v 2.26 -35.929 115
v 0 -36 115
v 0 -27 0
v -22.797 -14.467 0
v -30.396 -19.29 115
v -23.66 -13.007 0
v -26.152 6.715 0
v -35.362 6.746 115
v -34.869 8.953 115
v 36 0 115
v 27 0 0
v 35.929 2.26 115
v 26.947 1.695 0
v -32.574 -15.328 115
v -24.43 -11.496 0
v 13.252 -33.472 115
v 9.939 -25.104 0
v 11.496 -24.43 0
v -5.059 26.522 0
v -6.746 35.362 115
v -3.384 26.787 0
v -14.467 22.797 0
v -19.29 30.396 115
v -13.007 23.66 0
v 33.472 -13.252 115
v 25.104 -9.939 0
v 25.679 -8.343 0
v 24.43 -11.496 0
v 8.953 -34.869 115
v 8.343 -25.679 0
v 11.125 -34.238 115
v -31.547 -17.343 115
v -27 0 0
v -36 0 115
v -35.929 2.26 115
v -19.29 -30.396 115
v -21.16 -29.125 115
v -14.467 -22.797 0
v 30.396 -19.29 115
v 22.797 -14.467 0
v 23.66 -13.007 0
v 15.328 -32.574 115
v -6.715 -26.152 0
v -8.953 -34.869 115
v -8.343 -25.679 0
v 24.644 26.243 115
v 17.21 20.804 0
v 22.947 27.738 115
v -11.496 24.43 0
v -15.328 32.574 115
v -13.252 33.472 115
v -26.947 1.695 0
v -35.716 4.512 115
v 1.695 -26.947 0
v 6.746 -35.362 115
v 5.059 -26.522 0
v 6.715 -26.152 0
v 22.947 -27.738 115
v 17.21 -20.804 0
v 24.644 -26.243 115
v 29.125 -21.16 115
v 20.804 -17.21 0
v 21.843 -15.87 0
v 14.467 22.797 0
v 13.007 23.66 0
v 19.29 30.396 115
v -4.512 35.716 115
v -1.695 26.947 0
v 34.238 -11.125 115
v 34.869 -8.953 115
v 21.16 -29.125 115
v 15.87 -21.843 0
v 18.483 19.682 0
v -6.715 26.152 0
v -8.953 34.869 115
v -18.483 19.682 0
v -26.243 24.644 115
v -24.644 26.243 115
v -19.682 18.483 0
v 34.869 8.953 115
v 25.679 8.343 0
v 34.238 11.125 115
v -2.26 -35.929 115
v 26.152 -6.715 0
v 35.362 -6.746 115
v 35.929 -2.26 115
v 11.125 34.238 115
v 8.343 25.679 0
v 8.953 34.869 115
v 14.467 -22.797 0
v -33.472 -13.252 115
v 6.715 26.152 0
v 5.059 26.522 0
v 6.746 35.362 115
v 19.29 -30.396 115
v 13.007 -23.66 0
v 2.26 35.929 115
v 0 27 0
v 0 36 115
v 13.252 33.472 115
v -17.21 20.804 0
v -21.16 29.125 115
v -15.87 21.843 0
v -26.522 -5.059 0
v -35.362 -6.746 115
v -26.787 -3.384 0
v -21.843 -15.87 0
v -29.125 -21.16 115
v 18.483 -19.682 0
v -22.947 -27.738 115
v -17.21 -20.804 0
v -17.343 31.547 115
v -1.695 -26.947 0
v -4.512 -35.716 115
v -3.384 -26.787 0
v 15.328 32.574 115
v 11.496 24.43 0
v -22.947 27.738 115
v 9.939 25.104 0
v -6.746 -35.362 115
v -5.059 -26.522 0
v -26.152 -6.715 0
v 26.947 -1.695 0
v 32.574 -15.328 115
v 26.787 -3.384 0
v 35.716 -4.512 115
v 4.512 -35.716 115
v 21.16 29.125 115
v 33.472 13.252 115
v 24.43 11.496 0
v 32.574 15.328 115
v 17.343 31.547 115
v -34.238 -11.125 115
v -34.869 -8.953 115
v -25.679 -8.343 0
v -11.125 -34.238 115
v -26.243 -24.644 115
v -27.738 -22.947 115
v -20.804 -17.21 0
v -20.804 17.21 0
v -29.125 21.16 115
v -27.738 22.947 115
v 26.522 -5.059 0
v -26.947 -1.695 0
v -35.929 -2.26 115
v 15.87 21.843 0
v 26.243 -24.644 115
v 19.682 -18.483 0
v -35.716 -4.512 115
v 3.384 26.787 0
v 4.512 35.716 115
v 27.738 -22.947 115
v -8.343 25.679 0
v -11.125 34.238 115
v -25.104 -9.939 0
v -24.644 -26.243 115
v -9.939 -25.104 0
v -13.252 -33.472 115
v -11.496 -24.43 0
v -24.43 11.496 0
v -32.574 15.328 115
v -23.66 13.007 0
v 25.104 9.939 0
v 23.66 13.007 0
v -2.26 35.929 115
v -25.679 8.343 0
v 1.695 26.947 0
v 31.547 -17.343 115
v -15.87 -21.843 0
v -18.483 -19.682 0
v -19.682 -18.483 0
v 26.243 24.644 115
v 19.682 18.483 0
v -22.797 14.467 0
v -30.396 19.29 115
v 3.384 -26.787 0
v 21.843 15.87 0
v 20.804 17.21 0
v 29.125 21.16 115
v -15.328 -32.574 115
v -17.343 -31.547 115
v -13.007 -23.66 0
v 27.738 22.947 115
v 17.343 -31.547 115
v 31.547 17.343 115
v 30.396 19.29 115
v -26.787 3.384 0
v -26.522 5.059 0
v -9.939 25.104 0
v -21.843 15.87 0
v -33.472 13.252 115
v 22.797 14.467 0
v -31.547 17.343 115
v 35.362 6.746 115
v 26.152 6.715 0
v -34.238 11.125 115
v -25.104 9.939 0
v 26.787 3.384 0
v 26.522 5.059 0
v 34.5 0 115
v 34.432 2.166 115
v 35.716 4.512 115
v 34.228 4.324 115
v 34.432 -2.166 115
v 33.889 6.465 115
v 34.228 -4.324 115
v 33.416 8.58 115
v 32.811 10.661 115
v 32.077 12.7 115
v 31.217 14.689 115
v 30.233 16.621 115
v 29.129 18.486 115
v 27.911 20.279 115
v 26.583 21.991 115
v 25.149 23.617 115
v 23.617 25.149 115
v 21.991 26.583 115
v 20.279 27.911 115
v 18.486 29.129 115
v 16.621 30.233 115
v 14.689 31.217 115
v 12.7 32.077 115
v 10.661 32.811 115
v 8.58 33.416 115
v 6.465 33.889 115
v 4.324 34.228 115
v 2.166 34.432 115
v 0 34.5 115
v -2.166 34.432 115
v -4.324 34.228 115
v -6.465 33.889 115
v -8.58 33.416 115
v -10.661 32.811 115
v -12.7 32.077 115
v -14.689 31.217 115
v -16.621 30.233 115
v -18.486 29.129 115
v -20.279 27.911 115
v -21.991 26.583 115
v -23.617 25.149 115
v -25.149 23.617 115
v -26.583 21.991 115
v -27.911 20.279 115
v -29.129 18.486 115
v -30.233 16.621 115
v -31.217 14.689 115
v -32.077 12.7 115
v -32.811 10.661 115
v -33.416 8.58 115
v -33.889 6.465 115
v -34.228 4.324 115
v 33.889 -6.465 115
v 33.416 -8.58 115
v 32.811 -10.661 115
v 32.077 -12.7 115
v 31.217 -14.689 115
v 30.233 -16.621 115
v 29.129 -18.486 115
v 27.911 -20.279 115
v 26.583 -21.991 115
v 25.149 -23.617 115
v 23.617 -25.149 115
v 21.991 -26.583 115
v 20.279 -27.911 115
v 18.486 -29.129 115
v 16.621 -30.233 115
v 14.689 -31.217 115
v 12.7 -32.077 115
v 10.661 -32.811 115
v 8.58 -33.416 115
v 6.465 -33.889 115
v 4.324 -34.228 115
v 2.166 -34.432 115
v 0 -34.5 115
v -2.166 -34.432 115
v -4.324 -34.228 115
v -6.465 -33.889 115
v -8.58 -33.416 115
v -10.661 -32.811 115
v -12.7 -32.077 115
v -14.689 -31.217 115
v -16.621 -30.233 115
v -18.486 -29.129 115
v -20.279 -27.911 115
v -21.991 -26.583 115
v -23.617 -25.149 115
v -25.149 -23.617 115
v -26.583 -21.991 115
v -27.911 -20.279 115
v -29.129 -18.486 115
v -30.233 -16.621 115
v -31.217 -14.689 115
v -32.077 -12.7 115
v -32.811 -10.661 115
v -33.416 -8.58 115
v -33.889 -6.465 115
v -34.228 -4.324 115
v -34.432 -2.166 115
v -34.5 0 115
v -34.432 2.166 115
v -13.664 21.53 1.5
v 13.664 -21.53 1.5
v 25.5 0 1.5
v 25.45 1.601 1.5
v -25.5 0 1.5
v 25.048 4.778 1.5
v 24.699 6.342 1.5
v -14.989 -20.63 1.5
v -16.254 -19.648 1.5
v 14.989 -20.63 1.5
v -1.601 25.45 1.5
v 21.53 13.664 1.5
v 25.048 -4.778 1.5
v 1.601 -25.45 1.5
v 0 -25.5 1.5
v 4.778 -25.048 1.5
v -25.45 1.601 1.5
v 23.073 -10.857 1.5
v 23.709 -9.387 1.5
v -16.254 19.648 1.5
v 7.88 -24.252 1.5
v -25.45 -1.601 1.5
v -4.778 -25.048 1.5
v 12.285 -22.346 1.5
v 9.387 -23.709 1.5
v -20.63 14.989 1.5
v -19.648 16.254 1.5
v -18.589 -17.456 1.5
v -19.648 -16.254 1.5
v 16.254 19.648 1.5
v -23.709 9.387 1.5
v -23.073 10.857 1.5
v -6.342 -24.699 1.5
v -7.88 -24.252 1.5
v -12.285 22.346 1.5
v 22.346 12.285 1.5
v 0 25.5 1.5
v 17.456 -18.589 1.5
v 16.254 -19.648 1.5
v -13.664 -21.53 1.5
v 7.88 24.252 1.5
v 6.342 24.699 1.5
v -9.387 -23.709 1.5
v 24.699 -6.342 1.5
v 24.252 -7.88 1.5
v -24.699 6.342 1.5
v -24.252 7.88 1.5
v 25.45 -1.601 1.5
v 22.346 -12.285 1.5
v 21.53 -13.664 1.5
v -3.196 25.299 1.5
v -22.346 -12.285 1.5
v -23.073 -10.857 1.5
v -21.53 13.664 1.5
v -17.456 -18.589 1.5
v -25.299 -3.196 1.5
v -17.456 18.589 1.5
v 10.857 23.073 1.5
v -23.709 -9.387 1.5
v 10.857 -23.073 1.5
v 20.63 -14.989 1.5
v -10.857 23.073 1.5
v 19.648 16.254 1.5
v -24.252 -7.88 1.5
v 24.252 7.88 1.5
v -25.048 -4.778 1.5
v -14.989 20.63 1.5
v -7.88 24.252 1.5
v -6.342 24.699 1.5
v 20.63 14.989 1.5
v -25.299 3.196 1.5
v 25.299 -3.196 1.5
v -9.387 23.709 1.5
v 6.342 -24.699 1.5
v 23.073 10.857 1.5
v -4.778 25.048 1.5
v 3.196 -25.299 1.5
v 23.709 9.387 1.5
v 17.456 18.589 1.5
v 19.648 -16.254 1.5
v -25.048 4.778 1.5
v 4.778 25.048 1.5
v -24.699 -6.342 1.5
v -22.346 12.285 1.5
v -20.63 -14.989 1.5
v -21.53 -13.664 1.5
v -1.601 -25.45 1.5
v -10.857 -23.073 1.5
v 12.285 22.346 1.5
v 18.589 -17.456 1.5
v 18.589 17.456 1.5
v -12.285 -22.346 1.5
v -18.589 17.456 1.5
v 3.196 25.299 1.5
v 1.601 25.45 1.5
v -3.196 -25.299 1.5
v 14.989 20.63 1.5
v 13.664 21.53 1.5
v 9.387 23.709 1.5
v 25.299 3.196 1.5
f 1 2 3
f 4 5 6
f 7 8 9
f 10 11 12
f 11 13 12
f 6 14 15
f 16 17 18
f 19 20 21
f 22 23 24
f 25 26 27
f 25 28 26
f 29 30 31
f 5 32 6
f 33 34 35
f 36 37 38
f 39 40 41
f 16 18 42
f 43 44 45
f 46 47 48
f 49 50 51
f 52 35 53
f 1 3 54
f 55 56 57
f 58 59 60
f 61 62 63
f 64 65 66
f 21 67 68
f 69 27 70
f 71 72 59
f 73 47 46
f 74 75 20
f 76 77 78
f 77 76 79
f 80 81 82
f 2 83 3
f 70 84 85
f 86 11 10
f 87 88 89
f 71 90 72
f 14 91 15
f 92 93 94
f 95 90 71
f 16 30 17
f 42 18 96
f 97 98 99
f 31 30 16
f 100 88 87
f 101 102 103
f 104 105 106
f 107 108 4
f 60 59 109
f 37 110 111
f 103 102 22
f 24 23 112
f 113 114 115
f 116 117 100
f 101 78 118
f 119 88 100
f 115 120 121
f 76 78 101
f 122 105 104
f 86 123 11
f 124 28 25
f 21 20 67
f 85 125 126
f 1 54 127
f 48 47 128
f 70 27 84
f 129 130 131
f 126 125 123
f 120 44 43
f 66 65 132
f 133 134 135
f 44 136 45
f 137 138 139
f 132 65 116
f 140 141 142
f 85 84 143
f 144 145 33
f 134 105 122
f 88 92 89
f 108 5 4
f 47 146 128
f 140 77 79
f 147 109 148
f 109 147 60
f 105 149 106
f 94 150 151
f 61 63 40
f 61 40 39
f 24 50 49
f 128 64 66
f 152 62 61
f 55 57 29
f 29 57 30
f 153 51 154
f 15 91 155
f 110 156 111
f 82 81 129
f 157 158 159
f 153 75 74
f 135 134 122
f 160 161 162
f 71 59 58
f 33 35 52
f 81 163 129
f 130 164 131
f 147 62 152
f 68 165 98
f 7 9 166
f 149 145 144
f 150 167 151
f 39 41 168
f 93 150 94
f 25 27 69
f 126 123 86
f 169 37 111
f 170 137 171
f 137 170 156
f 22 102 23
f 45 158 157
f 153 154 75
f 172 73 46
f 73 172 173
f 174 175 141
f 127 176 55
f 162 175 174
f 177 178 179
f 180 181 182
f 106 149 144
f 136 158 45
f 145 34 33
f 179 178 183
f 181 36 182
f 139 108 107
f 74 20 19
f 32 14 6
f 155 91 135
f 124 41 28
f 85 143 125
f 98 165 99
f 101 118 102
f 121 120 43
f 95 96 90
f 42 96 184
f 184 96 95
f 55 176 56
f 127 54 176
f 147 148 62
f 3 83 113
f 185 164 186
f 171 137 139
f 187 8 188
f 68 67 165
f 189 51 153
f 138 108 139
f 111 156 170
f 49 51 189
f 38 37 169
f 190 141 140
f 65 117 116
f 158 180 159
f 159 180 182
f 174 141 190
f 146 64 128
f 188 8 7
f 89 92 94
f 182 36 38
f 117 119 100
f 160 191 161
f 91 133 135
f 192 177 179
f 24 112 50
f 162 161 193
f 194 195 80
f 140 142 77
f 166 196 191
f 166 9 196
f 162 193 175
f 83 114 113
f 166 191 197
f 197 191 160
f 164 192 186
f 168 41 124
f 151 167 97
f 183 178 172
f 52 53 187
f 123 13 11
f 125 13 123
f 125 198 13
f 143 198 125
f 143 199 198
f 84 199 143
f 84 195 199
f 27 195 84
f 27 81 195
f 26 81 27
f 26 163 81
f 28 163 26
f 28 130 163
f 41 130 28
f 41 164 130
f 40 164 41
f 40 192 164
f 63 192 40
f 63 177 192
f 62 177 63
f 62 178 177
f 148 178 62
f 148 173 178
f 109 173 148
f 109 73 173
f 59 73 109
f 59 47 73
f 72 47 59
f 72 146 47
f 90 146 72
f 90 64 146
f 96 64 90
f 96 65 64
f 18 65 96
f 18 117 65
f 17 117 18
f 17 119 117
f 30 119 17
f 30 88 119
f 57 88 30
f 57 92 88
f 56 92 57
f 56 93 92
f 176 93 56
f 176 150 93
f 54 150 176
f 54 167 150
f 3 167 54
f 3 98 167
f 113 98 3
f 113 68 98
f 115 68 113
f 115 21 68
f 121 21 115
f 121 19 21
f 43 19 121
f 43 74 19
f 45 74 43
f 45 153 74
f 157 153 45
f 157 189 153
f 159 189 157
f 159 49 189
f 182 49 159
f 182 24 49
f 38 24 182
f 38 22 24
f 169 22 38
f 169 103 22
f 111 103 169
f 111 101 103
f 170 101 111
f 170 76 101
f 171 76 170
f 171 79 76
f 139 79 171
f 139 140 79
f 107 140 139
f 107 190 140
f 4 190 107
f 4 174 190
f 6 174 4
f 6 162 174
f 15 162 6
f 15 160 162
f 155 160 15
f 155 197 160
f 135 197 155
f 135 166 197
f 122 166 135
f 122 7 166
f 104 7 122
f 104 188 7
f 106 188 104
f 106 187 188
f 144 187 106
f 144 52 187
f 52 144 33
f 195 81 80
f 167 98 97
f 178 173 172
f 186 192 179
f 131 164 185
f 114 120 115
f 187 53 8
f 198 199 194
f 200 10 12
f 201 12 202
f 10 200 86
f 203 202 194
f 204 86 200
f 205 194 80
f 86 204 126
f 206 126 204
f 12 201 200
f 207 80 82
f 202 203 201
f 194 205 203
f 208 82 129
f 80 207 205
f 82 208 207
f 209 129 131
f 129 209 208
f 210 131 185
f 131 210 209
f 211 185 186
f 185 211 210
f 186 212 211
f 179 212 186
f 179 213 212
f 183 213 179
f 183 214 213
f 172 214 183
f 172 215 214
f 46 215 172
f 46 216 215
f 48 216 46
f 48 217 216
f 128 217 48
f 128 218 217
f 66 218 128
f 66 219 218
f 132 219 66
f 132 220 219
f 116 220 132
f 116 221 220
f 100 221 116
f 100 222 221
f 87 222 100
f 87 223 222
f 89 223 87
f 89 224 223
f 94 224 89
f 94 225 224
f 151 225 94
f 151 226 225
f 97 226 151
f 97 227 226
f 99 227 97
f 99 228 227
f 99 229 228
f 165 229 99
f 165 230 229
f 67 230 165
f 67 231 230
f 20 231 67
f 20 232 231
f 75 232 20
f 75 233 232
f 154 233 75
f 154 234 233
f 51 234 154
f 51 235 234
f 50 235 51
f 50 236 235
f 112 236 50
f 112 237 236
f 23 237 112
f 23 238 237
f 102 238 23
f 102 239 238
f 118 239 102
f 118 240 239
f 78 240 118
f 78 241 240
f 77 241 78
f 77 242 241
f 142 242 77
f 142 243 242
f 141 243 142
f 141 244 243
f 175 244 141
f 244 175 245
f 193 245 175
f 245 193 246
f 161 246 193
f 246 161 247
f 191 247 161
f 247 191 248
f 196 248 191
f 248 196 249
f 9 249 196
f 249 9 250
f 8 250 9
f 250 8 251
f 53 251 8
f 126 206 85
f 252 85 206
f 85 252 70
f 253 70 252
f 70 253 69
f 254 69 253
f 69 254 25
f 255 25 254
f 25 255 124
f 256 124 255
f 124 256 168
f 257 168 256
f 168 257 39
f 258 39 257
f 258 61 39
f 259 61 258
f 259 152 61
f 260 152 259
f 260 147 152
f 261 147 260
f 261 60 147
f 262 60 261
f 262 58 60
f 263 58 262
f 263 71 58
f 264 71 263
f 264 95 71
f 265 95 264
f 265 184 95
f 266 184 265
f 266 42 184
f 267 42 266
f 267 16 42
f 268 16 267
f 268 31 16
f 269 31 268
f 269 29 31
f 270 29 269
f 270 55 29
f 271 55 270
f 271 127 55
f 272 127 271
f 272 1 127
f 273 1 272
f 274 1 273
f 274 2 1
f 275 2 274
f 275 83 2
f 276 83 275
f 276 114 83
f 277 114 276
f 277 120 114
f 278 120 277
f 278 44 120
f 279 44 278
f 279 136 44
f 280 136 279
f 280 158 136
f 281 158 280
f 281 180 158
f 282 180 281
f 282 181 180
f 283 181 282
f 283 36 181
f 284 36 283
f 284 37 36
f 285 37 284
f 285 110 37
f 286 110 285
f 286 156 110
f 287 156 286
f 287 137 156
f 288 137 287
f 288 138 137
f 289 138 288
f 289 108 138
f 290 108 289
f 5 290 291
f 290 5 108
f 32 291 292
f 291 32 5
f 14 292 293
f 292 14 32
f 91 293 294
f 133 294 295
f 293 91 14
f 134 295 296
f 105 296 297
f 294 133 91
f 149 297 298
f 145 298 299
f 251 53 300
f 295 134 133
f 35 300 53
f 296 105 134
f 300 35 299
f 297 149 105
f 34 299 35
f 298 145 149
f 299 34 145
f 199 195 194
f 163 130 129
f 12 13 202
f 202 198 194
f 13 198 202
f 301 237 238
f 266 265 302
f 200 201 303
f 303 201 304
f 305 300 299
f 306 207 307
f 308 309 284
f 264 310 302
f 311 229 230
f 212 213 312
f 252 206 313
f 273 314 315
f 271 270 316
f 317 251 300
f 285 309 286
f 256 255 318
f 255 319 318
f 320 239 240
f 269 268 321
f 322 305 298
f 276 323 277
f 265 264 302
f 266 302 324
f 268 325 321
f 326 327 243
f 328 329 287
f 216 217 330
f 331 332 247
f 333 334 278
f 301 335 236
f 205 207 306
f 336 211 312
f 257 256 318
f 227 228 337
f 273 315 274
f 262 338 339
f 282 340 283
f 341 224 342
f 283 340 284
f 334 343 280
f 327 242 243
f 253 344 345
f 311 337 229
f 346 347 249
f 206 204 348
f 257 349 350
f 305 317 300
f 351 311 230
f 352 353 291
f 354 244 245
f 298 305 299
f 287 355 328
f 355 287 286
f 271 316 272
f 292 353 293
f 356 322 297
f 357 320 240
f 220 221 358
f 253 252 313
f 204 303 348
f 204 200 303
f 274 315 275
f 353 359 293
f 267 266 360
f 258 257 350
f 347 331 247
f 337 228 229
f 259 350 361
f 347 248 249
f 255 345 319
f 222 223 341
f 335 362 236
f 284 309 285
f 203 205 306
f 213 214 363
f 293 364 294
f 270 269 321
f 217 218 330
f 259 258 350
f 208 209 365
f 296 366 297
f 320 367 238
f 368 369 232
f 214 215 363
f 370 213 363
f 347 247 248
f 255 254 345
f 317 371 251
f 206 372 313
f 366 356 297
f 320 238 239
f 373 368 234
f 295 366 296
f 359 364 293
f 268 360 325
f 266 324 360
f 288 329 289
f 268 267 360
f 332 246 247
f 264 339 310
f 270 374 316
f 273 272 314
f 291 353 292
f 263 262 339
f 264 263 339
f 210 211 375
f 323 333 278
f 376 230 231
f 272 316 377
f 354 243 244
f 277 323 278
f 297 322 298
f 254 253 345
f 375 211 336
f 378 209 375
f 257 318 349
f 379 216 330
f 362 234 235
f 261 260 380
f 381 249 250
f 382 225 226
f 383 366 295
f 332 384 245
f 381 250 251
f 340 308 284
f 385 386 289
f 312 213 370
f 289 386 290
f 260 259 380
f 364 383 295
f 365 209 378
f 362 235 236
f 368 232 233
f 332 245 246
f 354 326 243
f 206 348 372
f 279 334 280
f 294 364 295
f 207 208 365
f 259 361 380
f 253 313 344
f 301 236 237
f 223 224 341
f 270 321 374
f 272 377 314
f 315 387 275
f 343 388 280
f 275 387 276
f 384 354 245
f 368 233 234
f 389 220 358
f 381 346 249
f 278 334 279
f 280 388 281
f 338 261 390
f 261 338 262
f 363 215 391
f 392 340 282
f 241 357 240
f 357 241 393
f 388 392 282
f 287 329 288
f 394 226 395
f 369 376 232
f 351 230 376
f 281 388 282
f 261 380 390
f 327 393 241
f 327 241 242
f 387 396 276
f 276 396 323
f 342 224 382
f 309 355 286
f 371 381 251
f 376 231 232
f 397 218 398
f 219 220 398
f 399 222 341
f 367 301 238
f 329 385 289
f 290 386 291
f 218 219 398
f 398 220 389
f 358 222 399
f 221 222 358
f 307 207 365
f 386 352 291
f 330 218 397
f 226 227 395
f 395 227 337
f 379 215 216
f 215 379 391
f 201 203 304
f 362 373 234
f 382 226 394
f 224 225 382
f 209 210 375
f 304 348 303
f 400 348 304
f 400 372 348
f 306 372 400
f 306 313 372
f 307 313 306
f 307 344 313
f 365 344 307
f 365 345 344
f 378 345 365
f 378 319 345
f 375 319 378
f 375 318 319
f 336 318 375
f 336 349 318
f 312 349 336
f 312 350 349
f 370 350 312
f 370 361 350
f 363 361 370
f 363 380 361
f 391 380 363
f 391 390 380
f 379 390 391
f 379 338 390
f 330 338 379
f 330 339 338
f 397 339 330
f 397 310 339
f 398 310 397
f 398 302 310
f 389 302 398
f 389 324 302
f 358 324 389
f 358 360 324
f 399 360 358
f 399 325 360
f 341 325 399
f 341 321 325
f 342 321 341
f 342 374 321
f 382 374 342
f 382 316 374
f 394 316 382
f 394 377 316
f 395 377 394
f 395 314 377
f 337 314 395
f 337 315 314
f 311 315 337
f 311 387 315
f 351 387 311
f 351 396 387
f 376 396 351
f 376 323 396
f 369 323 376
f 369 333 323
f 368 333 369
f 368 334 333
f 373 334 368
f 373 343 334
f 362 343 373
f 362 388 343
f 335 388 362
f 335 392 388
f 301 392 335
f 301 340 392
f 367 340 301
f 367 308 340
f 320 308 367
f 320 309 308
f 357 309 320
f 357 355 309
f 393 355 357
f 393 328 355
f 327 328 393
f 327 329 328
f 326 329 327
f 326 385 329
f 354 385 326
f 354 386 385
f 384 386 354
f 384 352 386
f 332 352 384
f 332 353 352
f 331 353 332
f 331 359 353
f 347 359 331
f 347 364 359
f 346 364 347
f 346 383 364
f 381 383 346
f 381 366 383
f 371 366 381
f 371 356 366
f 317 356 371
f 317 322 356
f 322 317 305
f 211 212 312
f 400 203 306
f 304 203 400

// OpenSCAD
difference(){
    cylinder(r1=27,r2=36,h=115,$fn=100);
    translate([0,0,1.5])cylinder(r1=25.5,r2=34.5,h=113.5,$fn=100);
}
